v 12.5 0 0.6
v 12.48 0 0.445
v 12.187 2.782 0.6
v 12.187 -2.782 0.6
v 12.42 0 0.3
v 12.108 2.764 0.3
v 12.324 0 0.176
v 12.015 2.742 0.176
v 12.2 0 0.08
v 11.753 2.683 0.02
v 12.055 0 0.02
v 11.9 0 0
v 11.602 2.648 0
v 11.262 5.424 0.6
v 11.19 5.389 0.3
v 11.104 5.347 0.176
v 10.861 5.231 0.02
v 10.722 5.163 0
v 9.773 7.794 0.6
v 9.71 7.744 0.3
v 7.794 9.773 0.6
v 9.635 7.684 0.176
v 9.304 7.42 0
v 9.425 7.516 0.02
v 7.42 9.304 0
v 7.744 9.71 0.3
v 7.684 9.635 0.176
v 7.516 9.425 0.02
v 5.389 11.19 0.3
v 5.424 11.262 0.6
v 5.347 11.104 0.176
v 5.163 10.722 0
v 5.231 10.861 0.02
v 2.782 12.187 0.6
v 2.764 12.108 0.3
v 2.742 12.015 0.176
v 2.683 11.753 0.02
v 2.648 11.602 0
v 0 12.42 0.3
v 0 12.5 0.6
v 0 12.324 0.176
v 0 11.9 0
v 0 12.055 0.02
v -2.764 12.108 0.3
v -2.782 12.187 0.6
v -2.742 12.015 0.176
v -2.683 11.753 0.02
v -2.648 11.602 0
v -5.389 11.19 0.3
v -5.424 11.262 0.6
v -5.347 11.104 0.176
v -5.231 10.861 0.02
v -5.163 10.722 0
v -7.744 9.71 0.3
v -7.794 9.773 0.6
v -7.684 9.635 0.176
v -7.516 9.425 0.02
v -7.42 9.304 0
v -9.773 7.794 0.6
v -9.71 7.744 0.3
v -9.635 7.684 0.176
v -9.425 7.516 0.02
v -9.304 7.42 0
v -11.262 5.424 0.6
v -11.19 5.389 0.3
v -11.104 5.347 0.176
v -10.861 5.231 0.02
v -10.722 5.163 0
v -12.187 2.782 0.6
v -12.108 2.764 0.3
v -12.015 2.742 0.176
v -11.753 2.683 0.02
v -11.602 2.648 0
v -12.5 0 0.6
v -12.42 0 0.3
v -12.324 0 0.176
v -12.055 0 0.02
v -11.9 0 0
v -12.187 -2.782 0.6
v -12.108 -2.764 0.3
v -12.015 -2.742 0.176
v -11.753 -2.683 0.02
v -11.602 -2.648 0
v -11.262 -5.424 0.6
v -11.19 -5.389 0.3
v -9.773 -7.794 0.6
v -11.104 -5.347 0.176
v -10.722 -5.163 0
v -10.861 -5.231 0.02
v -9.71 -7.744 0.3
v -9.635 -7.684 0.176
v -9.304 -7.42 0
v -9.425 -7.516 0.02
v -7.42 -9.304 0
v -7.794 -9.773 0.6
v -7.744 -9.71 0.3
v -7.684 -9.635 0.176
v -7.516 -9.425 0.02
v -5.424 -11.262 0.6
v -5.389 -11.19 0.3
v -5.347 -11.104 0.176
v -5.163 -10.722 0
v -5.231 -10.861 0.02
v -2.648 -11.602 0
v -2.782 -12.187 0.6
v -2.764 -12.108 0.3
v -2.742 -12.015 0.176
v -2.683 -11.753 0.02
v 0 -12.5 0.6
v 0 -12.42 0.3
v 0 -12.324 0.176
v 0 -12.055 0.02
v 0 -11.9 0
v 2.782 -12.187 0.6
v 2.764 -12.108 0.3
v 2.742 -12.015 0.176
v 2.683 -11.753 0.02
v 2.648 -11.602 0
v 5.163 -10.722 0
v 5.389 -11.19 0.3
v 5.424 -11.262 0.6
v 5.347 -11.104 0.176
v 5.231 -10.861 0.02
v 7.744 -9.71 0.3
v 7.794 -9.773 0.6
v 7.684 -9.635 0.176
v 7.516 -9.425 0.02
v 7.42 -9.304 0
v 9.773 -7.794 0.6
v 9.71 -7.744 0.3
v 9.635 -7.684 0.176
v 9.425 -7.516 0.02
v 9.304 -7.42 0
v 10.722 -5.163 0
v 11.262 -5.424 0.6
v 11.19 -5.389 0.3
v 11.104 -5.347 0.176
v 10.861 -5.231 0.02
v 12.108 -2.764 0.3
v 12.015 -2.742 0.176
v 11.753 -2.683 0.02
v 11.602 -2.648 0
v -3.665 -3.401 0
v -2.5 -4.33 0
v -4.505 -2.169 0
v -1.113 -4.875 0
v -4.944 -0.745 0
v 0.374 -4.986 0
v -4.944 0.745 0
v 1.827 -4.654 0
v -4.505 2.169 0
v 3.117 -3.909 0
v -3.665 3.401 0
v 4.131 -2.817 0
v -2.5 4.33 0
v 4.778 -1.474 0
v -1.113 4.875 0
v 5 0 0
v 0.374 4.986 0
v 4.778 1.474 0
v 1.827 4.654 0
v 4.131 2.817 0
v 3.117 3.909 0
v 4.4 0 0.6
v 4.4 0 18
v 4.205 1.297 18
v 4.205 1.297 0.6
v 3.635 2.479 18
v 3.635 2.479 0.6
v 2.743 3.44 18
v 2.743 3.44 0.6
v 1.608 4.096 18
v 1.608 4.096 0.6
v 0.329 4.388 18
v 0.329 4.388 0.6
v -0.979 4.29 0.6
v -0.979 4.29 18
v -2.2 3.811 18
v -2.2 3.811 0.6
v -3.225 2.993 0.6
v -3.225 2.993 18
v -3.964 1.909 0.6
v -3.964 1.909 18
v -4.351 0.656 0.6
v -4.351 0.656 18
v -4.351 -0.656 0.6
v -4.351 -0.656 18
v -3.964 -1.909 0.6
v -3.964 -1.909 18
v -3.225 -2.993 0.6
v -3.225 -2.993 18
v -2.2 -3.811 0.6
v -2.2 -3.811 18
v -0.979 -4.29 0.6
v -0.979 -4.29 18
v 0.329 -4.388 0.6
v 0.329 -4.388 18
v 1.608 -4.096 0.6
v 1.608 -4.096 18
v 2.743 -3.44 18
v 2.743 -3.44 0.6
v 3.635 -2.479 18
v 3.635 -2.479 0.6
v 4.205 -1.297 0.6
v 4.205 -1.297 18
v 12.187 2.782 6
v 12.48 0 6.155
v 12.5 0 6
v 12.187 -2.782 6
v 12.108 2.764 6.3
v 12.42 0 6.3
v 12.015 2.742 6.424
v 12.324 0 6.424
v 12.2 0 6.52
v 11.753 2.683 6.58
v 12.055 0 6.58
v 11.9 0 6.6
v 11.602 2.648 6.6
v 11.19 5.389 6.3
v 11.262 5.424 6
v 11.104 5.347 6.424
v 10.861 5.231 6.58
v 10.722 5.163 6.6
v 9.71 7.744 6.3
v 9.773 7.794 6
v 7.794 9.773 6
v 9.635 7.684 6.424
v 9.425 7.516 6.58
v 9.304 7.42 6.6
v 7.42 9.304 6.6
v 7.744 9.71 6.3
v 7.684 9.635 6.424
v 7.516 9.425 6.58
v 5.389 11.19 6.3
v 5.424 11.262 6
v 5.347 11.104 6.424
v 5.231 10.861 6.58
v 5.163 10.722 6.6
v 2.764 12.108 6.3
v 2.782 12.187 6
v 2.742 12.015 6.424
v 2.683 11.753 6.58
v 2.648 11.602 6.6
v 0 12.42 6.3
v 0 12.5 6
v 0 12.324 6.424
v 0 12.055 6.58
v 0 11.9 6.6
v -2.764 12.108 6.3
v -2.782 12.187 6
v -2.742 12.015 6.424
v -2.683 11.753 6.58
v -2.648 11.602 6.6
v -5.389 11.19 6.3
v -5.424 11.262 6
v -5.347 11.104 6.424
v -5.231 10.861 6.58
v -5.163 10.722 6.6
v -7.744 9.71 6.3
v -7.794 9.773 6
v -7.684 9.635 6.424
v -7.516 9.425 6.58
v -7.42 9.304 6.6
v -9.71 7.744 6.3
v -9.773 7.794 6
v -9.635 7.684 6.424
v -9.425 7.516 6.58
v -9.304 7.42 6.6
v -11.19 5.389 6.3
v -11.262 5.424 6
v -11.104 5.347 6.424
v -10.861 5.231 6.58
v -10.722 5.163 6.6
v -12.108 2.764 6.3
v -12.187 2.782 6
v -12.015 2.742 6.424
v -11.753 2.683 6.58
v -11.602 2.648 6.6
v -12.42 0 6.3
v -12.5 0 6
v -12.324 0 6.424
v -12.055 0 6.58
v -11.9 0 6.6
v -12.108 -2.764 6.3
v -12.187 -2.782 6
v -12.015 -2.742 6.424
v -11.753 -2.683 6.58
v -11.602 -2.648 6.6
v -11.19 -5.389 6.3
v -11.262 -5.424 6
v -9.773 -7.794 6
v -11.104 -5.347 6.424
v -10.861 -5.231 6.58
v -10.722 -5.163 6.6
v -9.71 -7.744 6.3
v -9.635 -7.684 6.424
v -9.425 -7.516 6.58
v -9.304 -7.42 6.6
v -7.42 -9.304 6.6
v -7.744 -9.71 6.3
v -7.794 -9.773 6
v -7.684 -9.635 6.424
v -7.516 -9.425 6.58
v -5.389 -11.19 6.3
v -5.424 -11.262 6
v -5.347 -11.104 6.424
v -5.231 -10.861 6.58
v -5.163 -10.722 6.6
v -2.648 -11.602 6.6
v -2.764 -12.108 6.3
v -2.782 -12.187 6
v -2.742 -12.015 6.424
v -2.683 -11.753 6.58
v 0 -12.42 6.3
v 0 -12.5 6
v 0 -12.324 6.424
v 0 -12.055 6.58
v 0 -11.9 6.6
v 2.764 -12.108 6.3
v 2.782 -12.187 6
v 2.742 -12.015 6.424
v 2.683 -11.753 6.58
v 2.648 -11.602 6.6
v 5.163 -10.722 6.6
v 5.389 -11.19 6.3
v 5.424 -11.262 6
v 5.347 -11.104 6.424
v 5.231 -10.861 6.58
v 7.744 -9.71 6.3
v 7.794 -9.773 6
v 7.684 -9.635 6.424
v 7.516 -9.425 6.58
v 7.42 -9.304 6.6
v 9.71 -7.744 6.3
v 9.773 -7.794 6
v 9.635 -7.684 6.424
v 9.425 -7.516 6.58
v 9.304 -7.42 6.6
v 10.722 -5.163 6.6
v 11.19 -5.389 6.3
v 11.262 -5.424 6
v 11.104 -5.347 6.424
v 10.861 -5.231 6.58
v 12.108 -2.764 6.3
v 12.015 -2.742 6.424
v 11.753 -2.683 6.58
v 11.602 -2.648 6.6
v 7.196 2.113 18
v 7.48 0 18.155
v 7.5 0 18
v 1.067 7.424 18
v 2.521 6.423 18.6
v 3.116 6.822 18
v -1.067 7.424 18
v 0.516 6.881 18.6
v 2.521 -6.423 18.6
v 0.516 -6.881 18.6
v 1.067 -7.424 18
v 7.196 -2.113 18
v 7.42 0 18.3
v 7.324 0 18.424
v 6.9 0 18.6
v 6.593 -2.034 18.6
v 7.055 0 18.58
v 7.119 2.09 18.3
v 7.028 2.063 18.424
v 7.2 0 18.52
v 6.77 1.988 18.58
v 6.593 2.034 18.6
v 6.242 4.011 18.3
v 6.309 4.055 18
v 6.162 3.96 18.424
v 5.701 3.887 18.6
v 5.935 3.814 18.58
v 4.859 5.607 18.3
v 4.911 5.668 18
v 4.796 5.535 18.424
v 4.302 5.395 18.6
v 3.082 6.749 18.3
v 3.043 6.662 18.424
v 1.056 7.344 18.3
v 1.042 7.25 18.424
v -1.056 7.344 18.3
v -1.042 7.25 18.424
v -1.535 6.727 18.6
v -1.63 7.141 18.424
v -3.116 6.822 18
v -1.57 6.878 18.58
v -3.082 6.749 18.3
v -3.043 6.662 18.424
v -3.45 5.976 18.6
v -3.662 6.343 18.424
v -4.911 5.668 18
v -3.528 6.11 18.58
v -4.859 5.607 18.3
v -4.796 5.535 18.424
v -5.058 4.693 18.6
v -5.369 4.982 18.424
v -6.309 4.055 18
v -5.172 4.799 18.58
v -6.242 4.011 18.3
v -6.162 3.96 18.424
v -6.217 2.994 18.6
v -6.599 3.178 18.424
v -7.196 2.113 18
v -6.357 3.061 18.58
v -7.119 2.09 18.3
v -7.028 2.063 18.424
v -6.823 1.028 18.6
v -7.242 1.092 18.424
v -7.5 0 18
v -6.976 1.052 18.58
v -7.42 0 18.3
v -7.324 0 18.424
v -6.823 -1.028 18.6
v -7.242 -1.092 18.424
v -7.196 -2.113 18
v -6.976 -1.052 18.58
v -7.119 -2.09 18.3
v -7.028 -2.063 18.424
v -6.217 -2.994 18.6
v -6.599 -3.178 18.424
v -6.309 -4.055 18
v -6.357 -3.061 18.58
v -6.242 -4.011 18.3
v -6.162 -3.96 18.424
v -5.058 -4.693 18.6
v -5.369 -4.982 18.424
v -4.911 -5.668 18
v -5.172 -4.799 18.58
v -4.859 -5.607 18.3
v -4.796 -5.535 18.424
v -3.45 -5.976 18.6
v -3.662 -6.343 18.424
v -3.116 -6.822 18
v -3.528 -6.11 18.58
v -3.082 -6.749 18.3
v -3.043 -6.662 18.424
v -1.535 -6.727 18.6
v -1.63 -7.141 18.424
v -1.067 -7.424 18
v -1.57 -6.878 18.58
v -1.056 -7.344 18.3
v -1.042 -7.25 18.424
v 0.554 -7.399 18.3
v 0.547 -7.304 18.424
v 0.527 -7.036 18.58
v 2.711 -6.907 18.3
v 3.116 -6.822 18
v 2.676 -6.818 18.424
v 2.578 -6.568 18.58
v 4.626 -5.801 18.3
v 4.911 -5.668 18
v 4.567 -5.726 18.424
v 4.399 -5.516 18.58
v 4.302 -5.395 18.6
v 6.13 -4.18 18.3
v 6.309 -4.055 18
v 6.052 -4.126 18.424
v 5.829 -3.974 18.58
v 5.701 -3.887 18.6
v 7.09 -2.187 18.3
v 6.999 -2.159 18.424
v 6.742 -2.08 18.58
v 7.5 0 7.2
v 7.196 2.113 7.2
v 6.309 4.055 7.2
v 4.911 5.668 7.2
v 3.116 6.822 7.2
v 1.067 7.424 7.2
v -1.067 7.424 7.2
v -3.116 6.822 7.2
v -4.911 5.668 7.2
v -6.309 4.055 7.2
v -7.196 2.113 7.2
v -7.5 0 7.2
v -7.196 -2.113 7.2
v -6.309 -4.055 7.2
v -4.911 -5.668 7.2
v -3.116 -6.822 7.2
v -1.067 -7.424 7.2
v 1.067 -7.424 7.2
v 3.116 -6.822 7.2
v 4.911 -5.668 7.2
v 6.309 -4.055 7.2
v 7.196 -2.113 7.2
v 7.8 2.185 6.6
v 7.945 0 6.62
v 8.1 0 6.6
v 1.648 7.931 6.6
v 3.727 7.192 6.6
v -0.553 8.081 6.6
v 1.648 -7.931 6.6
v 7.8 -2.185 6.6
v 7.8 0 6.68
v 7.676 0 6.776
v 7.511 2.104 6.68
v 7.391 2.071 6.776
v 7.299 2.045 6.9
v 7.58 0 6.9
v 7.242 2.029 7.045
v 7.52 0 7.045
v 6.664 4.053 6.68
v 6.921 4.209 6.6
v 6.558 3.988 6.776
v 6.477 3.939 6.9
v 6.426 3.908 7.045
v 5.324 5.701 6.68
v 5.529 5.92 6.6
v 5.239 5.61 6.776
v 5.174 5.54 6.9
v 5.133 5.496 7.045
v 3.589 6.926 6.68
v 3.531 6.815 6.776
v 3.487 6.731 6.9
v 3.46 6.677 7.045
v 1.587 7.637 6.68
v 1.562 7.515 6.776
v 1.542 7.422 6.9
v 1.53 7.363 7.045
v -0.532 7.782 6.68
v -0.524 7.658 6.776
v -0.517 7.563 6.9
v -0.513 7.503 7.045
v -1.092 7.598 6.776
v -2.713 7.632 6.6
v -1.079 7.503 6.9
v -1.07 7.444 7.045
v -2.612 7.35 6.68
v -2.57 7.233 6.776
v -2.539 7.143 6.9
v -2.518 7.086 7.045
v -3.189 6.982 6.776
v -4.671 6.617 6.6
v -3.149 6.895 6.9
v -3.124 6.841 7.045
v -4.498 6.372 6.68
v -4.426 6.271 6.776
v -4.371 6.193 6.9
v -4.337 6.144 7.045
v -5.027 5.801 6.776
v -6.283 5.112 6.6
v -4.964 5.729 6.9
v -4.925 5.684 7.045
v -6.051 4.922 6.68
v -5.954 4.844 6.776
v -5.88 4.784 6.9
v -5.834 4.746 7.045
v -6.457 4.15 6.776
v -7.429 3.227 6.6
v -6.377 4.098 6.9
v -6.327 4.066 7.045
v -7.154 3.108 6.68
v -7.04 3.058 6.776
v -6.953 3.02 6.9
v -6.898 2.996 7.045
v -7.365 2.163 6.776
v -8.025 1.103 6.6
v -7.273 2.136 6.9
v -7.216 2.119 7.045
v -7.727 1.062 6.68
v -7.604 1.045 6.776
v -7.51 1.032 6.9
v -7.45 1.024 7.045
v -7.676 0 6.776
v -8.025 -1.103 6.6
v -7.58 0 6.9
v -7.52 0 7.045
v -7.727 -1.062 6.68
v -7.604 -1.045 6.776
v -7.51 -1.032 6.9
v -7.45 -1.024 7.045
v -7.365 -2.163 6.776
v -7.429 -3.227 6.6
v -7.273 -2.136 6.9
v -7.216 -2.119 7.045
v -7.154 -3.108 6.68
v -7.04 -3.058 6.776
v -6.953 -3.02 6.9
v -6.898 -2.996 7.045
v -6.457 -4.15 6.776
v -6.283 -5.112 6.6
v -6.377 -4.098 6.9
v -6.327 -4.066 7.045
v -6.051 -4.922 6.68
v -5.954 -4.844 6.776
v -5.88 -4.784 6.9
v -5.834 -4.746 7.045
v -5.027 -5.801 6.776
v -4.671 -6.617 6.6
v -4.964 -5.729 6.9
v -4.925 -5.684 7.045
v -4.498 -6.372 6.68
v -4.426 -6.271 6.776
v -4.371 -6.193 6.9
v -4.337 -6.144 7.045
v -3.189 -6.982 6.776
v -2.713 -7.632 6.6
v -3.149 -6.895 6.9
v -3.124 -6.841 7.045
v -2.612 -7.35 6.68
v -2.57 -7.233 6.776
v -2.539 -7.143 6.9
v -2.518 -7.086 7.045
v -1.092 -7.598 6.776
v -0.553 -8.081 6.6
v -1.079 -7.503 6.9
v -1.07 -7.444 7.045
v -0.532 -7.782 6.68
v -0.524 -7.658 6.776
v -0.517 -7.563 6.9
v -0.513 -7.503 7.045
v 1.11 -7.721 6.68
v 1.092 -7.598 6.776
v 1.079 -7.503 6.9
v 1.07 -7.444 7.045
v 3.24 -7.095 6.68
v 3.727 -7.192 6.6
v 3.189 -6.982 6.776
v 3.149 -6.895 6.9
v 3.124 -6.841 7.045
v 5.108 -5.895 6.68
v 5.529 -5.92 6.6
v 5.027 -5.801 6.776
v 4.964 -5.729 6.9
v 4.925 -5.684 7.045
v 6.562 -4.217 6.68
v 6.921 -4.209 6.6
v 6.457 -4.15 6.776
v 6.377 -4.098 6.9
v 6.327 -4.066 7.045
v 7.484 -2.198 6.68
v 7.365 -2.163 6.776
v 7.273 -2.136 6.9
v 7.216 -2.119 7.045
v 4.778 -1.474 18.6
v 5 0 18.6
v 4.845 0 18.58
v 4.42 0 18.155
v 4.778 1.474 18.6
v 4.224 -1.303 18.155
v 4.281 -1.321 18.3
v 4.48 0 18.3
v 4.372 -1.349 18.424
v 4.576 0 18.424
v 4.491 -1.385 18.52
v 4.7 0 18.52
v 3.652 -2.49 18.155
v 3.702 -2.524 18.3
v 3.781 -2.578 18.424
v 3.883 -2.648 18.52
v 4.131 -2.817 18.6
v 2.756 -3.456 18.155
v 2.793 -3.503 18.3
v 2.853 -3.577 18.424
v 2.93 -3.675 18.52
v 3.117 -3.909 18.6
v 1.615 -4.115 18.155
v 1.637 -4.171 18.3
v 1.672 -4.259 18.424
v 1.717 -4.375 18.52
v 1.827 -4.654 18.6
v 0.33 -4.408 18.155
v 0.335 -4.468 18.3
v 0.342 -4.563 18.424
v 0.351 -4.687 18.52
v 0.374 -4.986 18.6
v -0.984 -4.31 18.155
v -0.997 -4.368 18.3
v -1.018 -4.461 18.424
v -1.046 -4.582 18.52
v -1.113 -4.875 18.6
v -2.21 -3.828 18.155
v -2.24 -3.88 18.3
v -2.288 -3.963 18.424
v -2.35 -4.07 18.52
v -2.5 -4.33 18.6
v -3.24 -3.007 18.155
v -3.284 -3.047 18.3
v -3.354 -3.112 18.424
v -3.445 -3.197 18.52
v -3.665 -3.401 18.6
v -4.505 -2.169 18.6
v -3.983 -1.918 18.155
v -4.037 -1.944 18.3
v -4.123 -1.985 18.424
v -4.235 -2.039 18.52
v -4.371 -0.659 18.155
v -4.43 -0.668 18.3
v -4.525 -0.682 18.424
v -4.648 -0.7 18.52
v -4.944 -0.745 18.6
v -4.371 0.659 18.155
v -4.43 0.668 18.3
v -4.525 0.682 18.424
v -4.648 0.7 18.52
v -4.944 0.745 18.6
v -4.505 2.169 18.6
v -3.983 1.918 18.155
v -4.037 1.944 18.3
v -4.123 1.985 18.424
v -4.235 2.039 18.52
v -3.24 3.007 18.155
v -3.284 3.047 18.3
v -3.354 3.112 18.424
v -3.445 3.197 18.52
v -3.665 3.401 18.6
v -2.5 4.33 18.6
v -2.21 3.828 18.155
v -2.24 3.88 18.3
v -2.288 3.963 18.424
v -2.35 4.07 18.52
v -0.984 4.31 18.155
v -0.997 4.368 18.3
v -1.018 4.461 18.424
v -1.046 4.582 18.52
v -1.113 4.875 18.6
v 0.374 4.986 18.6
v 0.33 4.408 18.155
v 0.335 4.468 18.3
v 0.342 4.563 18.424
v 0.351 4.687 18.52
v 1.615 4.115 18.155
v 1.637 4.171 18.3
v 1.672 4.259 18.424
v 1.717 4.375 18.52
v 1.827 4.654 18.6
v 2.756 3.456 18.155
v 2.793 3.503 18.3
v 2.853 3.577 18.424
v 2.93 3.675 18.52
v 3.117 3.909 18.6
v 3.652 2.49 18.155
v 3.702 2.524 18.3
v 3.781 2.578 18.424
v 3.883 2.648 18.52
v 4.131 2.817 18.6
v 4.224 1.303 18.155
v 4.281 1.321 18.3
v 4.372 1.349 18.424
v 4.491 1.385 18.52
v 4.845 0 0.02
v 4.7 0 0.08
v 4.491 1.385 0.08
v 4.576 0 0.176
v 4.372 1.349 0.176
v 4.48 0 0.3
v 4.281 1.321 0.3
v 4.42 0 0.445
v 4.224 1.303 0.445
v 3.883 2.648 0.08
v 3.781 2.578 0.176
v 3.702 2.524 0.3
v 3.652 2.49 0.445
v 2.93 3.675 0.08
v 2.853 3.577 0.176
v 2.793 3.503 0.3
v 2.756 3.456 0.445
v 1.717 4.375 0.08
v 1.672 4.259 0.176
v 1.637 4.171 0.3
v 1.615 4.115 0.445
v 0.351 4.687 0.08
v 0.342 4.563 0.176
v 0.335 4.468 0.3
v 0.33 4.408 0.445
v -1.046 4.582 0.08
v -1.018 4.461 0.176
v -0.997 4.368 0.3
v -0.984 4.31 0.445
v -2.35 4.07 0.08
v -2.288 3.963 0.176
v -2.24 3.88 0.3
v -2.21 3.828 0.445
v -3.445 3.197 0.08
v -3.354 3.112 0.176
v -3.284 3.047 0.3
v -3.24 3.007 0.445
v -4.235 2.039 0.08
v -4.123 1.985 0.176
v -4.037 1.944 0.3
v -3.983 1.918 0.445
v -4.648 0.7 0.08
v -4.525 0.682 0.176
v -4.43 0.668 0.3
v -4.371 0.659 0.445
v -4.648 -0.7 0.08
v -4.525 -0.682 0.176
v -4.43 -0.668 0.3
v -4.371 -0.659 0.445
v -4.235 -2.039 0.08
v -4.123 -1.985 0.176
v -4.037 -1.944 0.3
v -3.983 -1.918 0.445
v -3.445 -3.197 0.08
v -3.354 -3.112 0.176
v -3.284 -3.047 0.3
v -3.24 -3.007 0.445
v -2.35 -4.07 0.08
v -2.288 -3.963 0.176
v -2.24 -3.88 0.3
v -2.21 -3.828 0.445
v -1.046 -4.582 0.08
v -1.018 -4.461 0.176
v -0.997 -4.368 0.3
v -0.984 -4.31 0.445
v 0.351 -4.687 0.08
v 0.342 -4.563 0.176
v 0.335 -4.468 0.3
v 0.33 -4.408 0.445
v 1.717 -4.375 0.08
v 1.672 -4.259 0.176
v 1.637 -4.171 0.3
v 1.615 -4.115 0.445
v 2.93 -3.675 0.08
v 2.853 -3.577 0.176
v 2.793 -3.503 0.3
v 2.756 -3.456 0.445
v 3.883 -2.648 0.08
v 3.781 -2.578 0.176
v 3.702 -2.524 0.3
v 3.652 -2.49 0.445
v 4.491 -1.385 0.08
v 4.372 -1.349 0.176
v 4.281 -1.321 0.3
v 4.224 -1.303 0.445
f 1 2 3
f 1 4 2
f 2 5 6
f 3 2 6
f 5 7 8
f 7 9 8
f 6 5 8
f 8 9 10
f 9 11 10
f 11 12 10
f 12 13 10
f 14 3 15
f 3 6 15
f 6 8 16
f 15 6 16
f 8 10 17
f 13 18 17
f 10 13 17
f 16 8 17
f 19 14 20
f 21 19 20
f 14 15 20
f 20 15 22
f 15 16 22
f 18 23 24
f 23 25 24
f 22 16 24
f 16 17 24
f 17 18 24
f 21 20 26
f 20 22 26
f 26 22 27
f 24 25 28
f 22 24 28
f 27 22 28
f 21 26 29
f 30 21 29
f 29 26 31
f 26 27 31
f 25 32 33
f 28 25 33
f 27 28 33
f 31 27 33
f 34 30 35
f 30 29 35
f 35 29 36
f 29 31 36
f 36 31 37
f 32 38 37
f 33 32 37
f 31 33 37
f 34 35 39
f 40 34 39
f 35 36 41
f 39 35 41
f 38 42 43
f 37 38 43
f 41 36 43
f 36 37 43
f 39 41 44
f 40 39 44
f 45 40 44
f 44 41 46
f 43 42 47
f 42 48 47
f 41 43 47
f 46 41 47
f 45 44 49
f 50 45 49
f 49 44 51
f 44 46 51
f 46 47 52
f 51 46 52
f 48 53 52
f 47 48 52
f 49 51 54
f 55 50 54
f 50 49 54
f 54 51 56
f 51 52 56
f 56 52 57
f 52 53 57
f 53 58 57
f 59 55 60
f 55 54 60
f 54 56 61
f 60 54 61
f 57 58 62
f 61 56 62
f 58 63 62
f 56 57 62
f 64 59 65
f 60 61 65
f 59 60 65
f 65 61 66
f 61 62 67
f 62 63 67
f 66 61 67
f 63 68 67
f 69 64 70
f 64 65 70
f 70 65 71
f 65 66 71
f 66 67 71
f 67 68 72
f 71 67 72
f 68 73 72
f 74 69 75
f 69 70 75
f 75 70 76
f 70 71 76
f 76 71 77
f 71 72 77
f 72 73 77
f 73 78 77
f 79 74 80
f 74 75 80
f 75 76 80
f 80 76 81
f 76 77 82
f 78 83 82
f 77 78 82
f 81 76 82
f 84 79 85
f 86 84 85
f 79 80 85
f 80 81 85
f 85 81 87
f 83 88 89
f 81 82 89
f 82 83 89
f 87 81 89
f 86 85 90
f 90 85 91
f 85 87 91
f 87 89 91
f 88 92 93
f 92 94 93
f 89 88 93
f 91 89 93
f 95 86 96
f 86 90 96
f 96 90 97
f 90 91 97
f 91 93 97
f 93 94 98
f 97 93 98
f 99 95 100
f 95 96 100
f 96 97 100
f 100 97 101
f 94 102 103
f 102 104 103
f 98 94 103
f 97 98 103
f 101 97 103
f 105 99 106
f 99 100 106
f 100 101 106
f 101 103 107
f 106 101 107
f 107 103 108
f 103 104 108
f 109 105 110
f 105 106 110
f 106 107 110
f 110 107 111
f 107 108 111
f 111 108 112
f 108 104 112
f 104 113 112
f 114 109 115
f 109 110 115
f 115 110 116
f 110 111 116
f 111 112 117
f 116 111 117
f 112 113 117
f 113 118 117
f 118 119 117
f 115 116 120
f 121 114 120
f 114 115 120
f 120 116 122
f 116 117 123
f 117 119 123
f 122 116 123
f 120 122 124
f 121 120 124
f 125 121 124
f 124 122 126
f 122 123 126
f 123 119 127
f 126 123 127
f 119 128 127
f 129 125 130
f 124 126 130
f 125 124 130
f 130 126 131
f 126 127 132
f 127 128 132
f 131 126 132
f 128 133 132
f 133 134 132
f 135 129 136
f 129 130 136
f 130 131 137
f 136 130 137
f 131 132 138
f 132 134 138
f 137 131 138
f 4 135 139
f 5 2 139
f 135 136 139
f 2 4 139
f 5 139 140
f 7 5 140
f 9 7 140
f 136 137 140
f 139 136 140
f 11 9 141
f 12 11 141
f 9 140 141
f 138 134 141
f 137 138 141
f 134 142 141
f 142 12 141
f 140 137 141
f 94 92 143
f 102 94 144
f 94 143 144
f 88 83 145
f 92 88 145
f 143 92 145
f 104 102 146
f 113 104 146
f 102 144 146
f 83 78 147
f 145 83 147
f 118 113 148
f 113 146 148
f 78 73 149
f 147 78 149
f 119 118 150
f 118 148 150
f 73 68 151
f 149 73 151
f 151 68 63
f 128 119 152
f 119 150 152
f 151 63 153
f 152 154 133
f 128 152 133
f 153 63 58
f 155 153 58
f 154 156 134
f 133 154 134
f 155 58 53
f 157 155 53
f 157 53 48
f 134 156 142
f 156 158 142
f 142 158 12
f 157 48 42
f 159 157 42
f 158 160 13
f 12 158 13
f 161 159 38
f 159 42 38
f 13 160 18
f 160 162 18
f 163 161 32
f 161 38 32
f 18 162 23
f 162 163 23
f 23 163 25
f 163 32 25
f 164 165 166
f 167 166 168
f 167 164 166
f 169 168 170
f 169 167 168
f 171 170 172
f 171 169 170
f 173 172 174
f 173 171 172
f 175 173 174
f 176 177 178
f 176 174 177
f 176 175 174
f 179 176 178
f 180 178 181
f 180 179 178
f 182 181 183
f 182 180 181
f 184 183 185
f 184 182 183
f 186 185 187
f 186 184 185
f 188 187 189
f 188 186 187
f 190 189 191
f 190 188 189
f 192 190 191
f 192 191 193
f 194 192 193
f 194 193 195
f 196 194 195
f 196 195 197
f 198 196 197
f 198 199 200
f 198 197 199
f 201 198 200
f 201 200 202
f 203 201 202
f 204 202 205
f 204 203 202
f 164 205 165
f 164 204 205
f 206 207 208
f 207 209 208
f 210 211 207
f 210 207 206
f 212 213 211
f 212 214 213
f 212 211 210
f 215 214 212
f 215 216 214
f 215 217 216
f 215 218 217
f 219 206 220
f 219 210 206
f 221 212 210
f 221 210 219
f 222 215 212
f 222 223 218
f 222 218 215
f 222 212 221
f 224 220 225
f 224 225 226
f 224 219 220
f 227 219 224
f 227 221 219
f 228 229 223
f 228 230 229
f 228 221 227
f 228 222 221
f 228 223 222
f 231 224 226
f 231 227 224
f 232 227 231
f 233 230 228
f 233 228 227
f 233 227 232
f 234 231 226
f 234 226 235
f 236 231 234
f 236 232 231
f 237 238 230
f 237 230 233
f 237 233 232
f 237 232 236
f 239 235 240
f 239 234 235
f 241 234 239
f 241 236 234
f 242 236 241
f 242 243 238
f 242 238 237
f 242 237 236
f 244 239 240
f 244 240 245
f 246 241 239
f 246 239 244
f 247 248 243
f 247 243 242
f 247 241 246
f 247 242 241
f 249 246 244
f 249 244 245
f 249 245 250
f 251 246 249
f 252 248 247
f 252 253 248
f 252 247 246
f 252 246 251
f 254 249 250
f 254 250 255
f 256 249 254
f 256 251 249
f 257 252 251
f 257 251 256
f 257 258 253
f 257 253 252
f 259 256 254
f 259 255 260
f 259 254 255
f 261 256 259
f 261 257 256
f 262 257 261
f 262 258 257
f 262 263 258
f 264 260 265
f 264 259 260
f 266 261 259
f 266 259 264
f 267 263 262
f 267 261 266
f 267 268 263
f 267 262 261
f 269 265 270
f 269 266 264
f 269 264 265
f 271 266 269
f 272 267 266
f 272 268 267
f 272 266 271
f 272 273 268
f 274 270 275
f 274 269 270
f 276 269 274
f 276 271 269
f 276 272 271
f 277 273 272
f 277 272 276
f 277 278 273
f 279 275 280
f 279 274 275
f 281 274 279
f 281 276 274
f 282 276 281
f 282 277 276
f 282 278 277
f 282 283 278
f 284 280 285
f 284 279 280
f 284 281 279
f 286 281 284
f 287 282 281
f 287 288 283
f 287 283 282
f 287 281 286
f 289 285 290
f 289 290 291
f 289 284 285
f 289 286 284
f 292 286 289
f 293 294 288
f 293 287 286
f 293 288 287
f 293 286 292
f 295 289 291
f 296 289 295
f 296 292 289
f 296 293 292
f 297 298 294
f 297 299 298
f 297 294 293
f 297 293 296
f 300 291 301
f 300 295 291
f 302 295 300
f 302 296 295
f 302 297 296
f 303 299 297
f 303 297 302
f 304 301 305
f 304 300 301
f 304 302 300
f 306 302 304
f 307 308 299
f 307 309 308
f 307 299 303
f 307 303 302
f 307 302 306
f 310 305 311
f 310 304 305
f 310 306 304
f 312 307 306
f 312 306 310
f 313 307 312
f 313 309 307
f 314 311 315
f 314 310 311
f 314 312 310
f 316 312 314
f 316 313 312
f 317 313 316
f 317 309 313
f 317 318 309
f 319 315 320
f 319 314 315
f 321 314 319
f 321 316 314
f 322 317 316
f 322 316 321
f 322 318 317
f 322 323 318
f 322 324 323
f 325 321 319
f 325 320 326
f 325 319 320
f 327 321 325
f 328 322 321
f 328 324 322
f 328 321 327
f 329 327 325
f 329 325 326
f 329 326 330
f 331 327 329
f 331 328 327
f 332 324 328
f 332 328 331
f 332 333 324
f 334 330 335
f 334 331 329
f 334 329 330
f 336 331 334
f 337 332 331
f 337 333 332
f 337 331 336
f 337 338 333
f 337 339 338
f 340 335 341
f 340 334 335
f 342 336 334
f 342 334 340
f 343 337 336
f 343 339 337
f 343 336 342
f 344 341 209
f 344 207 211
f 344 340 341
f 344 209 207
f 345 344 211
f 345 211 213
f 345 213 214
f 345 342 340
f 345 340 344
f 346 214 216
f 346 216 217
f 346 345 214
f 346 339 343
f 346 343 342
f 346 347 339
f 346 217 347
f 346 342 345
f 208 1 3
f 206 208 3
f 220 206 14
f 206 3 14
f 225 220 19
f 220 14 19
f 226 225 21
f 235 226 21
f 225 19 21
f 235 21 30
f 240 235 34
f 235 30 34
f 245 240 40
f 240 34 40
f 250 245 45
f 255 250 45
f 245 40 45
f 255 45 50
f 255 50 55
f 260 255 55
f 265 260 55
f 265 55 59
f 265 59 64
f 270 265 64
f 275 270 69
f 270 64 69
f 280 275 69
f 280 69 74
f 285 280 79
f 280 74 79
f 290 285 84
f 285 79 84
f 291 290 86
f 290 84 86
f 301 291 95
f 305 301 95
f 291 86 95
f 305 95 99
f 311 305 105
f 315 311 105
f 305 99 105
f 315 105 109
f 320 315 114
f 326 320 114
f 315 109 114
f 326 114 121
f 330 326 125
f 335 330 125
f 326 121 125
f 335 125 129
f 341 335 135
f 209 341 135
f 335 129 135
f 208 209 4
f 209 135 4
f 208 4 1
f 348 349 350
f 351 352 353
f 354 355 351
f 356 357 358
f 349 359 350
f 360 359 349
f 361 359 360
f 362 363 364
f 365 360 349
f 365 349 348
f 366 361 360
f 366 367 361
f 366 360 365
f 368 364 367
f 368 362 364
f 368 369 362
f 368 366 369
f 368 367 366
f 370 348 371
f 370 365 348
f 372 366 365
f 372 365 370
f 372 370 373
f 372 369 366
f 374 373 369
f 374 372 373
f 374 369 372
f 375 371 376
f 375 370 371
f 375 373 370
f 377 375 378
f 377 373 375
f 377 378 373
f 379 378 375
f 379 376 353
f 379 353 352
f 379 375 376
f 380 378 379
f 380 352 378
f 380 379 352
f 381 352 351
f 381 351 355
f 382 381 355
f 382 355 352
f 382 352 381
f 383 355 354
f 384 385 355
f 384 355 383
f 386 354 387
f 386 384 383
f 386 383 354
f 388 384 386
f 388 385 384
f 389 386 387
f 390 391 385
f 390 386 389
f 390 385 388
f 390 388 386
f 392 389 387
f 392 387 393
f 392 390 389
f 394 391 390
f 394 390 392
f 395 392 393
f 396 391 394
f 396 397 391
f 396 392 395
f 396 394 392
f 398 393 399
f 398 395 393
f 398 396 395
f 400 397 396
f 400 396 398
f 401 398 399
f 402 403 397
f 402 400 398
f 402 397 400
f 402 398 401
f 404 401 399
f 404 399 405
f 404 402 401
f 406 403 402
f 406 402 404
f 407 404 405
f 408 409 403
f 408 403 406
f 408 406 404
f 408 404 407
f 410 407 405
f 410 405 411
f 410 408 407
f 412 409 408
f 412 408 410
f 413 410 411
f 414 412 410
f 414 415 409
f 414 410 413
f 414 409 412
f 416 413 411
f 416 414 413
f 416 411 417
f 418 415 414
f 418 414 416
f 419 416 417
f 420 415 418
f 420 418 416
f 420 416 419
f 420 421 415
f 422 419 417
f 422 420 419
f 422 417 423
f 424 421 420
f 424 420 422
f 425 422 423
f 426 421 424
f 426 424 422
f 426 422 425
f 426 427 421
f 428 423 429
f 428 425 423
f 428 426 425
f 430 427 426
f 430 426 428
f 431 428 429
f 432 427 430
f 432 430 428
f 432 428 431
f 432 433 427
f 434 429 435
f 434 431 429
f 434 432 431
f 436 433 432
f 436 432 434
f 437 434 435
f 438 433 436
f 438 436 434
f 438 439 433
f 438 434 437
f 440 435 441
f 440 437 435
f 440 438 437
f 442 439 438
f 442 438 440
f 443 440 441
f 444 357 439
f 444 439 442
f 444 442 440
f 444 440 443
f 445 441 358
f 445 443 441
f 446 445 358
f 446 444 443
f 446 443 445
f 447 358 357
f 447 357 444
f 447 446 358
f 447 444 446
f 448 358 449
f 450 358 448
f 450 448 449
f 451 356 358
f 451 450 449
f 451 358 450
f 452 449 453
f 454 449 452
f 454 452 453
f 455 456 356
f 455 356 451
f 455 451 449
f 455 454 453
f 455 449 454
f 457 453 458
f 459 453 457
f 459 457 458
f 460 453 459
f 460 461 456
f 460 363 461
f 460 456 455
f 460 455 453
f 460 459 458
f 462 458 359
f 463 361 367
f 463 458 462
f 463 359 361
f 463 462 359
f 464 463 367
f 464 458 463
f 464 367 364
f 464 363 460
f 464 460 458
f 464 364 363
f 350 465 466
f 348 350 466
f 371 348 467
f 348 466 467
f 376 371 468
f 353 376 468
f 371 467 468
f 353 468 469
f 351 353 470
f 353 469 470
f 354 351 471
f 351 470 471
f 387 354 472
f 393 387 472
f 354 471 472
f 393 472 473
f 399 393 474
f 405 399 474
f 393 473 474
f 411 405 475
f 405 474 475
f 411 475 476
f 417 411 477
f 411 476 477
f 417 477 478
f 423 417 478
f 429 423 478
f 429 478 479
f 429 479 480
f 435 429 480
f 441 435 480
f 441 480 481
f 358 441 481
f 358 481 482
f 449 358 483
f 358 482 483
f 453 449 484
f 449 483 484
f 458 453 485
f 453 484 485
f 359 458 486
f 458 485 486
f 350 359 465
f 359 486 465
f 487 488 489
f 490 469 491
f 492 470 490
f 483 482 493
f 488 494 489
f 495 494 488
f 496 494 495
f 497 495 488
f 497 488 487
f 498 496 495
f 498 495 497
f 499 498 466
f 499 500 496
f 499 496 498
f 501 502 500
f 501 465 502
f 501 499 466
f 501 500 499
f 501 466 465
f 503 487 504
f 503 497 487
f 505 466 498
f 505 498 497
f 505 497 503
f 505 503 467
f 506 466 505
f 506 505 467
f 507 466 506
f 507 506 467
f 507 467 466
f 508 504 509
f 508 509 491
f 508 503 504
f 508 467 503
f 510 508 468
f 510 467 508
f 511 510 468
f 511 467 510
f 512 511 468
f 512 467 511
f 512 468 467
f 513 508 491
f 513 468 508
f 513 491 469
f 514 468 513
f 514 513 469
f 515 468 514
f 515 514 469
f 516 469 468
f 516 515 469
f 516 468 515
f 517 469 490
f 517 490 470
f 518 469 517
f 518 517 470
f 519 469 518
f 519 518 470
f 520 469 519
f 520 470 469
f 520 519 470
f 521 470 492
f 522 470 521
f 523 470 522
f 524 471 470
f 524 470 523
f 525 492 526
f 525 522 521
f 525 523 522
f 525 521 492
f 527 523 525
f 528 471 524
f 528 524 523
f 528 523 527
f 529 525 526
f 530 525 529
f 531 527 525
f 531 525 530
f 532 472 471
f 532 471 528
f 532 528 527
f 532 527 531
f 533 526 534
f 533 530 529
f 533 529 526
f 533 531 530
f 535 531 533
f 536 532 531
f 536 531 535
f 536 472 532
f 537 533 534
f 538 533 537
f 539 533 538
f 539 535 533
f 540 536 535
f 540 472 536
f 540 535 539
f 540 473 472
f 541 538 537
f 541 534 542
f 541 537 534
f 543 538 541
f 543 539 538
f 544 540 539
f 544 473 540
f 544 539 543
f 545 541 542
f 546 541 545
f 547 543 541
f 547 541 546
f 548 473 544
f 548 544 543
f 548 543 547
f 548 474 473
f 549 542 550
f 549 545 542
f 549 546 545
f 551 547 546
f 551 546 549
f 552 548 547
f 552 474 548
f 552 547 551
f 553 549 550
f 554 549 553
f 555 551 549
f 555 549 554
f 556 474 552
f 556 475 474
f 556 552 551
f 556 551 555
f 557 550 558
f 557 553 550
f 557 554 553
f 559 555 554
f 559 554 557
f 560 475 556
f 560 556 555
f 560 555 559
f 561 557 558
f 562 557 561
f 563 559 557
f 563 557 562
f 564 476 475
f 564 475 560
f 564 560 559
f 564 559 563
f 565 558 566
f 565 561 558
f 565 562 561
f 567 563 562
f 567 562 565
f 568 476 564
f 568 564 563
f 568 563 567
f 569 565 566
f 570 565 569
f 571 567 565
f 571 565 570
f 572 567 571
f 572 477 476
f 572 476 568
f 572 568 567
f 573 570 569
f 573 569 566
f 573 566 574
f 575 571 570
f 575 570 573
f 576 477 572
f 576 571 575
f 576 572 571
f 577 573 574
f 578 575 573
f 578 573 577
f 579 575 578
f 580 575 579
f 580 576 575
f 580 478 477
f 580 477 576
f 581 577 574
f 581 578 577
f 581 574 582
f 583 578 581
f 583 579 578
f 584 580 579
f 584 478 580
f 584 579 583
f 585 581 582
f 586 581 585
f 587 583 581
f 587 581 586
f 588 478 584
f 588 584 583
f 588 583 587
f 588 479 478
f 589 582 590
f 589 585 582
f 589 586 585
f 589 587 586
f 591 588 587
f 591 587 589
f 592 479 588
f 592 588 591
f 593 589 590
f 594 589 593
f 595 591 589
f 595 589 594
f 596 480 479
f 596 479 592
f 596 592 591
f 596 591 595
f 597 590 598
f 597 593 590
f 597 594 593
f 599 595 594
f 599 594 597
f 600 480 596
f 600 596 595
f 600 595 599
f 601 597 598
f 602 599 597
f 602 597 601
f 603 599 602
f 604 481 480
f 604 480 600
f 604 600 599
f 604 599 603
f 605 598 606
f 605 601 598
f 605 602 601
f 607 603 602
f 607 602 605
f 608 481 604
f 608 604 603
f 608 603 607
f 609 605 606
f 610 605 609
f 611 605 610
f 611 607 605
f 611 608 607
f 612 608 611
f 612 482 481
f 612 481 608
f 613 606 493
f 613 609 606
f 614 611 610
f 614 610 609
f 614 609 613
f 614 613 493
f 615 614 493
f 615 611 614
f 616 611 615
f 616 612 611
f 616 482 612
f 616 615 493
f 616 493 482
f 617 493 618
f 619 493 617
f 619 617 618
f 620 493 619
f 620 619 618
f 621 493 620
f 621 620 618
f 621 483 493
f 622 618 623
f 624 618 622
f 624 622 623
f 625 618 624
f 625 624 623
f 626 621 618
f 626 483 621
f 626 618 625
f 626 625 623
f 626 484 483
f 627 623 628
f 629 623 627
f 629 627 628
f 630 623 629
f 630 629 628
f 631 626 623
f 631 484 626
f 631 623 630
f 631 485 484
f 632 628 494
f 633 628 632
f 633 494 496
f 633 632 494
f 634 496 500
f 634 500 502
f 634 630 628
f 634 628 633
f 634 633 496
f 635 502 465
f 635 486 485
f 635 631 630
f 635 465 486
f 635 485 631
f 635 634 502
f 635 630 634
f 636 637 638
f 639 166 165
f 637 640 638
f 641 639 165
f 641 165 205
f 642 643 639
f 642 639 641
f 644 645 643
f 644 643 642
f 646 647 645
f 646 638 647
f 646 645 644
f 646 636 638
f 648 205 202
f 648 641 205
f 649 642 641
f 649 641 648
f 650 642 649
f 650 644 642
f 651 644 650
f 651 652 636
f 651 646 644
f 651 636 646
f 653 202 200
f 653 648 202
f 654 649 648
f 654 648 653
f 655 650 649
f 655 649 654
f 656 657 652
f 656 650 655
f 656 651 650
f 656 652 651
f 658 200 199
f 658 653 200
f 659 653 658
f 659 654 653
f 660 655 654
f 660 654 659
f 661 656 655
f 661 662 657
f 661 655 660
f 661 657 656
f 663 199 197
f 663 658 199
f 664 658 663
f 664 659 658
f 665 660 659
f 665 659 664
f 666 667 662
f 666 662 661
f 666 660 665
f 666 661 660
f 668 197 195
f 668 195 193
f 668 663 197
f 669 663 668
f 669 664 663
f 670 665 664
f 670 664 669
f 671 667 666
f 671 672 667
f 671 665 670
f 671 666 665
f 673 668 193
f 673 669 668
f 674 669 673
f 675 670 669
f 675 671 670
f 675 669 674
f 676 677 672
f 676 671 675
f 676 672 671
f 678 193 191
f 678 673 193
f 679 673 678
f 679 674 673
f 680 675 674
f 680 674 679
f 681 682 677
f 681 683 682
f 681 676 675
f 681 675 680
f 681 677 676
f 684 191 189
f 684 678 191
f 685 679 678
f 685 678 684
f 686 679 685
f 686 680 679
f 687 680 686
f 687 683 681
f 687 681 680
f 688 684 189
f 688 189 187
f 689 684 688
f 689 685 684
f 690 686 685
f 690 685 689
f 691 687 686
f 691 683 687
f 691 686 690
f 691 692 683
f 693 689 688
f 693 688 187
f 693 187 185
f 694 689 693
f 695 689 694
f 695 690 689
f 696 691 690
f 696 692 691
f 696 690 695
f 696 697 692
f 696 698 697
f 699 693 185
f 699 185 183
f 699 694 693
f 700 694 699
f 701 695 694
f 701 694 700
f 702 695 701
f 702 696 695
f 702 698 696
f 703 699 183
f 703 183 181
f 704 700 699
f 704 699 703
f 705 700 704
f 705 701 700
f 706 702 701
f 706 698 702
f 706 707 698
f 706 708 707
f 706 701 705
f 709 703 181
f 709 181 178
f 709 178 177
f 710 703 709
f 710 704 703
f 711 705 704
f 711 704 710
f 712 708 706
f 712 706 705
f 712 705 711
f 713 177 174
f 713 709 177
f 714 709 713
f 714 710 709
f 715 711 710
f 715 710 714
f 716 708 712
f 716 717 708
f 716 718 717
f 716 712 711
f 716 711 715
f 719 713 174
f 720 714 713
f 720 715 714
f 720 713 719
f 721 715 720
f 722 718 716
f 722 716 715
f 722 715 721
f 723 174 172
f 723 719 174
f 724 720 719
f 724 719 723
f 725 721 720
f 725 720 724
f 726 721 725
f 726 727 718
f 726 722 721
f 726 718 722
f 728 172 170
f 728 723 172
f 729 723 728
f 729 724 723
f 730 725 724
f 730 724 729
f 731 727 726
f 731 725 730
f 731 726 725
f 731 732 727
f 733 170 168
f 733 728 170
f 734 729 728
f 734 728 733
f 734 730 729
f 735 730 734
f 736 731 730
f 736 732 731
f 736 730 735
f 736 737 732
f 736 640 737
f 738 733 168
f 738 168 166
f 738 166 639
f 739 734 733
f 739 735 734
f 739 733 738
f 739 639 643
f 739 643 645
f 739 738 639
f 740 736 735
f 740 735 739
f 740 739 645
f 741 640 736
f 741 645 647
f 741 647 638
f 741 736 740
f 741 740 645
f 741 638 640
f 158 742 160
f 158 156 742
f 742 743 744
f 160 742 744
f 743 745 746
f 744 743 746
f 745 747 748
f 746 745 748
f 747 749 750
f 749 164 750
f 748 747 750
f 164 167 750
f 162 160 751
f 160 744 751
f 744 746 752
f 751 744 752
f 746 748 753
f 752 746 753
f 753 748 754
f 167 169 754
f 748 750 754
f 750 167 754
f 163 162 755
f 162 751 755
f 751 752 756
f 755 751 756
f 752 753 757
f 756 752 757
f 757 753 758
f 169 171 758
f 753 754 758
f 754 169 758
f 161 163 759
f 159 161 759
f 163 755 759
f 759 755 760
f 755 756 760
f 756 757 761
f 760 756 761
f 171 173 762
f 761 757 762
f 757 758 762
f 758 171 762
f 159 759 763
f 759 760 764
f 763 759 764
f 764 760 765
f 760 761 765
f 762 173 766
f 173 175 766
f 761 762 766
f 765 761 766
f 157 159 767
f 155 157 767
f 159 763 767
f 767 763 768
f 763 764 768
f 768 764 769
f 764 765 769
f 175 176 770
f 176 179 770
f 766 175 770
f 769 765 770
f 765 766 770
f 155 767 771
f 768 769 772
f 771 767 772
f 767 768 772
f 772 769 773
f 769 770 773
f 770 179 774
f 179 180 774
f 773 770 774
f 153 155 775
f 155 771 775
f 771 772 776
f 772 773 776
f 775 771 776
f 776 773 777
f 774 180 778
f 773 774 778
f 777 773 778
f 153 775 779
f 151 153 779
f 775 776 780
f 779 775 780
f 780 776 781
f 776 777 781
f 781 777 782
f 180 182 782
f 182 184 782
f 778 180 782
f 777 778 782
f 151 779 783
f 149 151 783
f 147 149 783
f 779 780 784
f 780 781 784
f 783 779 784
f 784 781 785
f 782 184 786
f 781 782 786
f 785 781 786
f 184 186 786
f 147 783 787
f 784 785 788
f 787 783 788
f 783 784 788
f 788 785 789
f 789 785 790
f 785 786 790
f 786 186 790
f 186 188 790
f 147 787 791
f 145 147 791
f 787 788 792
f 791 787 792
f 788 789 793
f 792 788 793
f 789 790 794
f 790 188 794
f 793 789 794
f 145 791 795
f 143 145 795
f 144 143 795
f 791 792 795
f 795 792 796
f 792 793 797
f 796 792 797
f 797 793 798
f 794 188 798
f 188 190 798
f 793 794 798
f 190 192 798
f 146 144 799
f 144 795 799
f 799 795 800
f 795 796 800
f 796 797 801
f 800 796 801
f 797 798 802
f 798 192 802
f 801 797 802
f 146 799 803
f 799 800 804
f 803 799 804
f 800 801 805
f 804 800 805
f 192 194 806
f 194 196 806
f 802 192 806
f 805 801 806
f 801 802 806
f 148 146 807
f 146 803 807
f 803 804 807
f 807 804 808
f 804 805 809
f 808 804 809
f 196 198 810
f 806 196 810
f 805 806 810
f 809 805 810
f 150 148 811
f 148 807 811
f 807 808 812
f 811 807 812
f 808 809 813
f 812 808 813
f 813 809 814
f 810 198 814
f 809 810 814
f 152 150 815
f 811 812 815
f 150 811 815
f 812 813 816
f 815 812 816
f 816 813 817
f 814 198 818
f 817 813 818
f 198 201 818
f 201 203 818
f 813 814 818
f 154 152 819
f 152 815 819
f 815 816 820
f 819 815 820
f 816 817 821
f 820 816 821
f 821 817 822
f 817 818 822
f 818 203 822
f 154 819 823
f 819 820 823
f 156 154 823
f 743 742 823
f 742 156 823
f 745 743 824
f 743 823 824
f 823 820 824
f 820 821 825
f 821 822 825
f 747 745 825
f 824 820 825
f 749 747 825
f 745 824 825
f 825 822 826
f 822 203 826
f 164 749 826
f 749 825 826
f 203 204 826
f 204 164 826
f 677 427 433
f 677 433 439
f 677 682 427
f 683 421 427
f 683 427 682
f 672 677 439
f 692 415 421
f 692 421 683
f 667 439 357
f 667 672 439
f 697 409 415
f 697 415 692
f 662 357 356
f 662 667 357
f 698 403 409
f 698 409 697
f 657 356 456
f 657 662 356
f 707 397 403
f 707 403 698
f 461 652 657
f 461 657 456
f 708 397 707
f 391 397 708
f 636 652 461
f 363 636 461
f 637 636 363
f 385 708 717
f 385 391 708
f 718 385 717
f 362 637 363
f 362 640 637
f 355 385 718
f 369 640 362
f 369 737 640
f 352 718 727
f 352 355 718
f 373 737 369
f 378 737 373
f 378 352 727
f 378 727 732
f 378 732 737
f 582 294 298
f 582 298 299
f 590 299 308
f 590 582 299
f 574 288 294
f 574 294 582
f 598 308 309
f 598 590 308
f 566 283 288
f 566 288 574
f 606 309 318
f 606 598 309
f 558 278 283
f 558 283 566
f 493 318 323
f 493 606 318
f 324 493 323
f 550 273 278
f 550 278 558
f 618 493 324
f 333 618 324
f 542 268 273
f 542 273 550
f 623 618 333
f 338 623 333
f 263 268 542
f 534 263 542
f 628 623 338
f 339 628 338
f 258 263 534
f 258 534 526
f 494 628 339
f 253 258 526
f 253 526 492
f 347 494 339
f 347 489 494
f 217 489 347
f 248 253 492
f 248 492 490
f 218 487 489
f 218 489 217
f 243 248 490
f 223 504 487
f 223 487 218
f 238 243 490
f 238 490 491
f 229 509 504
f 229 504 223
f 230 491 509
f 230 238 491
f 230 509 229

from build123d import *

# Parameters (mm, degrees)
F0_R     = 12.5
F1_DEPTH = 6.6
F2_R     = 7.5
F3_DEPTH = 12
F4_R     = 4.4
F5_DEPTH = 18.601
F6_R     = 0.6


with BuildPart() as f1:
    # F0 (on Top) → F1 (new body)
    with BuildSketch(Plane.XY):
        Circle(F0_R)
    extrude(amount=F1_DEPTH)

    # F2 (on face) → F3 (join)
    with BuildSketch(Plane.XY.offset(6.6)):
        Circle(F2_R)
    extrude(amount=F3_DEPTH)

    # F4 (on Top) → F5 (cut, through all)
    with BuildSketch(Plane.XY):
        Circle(F4_R)
    extrude(amount=F5_DEPTH, mode=Mode.SUBTRACT)

    # F6
    f6_edges = [f1.edges().sort_by_distance(p)[0] for p in [
        (-4.4, 0, 18.6),
        (-7.5, 0, 18.6),
        (-7.5, 0, 6.6),
        (12.5, 0, 3.3),
        (-12.5, 0, 0),
        (-12.5, 0, 6.6),
        (-4.4, 0, 0),
    ]]
    fillet(f6_edges, radius=F6_R)


solid = f1.part
